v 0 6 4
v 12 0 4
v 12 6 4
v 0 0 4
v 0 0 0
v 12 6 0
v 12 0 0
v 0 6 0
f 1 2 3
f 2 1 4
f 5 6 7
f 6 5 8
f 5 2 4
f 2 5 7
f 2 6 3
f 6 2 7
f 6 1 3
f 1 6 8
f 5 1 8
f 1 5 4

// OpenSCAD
// Construct: variable binding driving a primitive dimension.
w = 12;
h = 6;
d = 4;
cube([w, h, d]);
